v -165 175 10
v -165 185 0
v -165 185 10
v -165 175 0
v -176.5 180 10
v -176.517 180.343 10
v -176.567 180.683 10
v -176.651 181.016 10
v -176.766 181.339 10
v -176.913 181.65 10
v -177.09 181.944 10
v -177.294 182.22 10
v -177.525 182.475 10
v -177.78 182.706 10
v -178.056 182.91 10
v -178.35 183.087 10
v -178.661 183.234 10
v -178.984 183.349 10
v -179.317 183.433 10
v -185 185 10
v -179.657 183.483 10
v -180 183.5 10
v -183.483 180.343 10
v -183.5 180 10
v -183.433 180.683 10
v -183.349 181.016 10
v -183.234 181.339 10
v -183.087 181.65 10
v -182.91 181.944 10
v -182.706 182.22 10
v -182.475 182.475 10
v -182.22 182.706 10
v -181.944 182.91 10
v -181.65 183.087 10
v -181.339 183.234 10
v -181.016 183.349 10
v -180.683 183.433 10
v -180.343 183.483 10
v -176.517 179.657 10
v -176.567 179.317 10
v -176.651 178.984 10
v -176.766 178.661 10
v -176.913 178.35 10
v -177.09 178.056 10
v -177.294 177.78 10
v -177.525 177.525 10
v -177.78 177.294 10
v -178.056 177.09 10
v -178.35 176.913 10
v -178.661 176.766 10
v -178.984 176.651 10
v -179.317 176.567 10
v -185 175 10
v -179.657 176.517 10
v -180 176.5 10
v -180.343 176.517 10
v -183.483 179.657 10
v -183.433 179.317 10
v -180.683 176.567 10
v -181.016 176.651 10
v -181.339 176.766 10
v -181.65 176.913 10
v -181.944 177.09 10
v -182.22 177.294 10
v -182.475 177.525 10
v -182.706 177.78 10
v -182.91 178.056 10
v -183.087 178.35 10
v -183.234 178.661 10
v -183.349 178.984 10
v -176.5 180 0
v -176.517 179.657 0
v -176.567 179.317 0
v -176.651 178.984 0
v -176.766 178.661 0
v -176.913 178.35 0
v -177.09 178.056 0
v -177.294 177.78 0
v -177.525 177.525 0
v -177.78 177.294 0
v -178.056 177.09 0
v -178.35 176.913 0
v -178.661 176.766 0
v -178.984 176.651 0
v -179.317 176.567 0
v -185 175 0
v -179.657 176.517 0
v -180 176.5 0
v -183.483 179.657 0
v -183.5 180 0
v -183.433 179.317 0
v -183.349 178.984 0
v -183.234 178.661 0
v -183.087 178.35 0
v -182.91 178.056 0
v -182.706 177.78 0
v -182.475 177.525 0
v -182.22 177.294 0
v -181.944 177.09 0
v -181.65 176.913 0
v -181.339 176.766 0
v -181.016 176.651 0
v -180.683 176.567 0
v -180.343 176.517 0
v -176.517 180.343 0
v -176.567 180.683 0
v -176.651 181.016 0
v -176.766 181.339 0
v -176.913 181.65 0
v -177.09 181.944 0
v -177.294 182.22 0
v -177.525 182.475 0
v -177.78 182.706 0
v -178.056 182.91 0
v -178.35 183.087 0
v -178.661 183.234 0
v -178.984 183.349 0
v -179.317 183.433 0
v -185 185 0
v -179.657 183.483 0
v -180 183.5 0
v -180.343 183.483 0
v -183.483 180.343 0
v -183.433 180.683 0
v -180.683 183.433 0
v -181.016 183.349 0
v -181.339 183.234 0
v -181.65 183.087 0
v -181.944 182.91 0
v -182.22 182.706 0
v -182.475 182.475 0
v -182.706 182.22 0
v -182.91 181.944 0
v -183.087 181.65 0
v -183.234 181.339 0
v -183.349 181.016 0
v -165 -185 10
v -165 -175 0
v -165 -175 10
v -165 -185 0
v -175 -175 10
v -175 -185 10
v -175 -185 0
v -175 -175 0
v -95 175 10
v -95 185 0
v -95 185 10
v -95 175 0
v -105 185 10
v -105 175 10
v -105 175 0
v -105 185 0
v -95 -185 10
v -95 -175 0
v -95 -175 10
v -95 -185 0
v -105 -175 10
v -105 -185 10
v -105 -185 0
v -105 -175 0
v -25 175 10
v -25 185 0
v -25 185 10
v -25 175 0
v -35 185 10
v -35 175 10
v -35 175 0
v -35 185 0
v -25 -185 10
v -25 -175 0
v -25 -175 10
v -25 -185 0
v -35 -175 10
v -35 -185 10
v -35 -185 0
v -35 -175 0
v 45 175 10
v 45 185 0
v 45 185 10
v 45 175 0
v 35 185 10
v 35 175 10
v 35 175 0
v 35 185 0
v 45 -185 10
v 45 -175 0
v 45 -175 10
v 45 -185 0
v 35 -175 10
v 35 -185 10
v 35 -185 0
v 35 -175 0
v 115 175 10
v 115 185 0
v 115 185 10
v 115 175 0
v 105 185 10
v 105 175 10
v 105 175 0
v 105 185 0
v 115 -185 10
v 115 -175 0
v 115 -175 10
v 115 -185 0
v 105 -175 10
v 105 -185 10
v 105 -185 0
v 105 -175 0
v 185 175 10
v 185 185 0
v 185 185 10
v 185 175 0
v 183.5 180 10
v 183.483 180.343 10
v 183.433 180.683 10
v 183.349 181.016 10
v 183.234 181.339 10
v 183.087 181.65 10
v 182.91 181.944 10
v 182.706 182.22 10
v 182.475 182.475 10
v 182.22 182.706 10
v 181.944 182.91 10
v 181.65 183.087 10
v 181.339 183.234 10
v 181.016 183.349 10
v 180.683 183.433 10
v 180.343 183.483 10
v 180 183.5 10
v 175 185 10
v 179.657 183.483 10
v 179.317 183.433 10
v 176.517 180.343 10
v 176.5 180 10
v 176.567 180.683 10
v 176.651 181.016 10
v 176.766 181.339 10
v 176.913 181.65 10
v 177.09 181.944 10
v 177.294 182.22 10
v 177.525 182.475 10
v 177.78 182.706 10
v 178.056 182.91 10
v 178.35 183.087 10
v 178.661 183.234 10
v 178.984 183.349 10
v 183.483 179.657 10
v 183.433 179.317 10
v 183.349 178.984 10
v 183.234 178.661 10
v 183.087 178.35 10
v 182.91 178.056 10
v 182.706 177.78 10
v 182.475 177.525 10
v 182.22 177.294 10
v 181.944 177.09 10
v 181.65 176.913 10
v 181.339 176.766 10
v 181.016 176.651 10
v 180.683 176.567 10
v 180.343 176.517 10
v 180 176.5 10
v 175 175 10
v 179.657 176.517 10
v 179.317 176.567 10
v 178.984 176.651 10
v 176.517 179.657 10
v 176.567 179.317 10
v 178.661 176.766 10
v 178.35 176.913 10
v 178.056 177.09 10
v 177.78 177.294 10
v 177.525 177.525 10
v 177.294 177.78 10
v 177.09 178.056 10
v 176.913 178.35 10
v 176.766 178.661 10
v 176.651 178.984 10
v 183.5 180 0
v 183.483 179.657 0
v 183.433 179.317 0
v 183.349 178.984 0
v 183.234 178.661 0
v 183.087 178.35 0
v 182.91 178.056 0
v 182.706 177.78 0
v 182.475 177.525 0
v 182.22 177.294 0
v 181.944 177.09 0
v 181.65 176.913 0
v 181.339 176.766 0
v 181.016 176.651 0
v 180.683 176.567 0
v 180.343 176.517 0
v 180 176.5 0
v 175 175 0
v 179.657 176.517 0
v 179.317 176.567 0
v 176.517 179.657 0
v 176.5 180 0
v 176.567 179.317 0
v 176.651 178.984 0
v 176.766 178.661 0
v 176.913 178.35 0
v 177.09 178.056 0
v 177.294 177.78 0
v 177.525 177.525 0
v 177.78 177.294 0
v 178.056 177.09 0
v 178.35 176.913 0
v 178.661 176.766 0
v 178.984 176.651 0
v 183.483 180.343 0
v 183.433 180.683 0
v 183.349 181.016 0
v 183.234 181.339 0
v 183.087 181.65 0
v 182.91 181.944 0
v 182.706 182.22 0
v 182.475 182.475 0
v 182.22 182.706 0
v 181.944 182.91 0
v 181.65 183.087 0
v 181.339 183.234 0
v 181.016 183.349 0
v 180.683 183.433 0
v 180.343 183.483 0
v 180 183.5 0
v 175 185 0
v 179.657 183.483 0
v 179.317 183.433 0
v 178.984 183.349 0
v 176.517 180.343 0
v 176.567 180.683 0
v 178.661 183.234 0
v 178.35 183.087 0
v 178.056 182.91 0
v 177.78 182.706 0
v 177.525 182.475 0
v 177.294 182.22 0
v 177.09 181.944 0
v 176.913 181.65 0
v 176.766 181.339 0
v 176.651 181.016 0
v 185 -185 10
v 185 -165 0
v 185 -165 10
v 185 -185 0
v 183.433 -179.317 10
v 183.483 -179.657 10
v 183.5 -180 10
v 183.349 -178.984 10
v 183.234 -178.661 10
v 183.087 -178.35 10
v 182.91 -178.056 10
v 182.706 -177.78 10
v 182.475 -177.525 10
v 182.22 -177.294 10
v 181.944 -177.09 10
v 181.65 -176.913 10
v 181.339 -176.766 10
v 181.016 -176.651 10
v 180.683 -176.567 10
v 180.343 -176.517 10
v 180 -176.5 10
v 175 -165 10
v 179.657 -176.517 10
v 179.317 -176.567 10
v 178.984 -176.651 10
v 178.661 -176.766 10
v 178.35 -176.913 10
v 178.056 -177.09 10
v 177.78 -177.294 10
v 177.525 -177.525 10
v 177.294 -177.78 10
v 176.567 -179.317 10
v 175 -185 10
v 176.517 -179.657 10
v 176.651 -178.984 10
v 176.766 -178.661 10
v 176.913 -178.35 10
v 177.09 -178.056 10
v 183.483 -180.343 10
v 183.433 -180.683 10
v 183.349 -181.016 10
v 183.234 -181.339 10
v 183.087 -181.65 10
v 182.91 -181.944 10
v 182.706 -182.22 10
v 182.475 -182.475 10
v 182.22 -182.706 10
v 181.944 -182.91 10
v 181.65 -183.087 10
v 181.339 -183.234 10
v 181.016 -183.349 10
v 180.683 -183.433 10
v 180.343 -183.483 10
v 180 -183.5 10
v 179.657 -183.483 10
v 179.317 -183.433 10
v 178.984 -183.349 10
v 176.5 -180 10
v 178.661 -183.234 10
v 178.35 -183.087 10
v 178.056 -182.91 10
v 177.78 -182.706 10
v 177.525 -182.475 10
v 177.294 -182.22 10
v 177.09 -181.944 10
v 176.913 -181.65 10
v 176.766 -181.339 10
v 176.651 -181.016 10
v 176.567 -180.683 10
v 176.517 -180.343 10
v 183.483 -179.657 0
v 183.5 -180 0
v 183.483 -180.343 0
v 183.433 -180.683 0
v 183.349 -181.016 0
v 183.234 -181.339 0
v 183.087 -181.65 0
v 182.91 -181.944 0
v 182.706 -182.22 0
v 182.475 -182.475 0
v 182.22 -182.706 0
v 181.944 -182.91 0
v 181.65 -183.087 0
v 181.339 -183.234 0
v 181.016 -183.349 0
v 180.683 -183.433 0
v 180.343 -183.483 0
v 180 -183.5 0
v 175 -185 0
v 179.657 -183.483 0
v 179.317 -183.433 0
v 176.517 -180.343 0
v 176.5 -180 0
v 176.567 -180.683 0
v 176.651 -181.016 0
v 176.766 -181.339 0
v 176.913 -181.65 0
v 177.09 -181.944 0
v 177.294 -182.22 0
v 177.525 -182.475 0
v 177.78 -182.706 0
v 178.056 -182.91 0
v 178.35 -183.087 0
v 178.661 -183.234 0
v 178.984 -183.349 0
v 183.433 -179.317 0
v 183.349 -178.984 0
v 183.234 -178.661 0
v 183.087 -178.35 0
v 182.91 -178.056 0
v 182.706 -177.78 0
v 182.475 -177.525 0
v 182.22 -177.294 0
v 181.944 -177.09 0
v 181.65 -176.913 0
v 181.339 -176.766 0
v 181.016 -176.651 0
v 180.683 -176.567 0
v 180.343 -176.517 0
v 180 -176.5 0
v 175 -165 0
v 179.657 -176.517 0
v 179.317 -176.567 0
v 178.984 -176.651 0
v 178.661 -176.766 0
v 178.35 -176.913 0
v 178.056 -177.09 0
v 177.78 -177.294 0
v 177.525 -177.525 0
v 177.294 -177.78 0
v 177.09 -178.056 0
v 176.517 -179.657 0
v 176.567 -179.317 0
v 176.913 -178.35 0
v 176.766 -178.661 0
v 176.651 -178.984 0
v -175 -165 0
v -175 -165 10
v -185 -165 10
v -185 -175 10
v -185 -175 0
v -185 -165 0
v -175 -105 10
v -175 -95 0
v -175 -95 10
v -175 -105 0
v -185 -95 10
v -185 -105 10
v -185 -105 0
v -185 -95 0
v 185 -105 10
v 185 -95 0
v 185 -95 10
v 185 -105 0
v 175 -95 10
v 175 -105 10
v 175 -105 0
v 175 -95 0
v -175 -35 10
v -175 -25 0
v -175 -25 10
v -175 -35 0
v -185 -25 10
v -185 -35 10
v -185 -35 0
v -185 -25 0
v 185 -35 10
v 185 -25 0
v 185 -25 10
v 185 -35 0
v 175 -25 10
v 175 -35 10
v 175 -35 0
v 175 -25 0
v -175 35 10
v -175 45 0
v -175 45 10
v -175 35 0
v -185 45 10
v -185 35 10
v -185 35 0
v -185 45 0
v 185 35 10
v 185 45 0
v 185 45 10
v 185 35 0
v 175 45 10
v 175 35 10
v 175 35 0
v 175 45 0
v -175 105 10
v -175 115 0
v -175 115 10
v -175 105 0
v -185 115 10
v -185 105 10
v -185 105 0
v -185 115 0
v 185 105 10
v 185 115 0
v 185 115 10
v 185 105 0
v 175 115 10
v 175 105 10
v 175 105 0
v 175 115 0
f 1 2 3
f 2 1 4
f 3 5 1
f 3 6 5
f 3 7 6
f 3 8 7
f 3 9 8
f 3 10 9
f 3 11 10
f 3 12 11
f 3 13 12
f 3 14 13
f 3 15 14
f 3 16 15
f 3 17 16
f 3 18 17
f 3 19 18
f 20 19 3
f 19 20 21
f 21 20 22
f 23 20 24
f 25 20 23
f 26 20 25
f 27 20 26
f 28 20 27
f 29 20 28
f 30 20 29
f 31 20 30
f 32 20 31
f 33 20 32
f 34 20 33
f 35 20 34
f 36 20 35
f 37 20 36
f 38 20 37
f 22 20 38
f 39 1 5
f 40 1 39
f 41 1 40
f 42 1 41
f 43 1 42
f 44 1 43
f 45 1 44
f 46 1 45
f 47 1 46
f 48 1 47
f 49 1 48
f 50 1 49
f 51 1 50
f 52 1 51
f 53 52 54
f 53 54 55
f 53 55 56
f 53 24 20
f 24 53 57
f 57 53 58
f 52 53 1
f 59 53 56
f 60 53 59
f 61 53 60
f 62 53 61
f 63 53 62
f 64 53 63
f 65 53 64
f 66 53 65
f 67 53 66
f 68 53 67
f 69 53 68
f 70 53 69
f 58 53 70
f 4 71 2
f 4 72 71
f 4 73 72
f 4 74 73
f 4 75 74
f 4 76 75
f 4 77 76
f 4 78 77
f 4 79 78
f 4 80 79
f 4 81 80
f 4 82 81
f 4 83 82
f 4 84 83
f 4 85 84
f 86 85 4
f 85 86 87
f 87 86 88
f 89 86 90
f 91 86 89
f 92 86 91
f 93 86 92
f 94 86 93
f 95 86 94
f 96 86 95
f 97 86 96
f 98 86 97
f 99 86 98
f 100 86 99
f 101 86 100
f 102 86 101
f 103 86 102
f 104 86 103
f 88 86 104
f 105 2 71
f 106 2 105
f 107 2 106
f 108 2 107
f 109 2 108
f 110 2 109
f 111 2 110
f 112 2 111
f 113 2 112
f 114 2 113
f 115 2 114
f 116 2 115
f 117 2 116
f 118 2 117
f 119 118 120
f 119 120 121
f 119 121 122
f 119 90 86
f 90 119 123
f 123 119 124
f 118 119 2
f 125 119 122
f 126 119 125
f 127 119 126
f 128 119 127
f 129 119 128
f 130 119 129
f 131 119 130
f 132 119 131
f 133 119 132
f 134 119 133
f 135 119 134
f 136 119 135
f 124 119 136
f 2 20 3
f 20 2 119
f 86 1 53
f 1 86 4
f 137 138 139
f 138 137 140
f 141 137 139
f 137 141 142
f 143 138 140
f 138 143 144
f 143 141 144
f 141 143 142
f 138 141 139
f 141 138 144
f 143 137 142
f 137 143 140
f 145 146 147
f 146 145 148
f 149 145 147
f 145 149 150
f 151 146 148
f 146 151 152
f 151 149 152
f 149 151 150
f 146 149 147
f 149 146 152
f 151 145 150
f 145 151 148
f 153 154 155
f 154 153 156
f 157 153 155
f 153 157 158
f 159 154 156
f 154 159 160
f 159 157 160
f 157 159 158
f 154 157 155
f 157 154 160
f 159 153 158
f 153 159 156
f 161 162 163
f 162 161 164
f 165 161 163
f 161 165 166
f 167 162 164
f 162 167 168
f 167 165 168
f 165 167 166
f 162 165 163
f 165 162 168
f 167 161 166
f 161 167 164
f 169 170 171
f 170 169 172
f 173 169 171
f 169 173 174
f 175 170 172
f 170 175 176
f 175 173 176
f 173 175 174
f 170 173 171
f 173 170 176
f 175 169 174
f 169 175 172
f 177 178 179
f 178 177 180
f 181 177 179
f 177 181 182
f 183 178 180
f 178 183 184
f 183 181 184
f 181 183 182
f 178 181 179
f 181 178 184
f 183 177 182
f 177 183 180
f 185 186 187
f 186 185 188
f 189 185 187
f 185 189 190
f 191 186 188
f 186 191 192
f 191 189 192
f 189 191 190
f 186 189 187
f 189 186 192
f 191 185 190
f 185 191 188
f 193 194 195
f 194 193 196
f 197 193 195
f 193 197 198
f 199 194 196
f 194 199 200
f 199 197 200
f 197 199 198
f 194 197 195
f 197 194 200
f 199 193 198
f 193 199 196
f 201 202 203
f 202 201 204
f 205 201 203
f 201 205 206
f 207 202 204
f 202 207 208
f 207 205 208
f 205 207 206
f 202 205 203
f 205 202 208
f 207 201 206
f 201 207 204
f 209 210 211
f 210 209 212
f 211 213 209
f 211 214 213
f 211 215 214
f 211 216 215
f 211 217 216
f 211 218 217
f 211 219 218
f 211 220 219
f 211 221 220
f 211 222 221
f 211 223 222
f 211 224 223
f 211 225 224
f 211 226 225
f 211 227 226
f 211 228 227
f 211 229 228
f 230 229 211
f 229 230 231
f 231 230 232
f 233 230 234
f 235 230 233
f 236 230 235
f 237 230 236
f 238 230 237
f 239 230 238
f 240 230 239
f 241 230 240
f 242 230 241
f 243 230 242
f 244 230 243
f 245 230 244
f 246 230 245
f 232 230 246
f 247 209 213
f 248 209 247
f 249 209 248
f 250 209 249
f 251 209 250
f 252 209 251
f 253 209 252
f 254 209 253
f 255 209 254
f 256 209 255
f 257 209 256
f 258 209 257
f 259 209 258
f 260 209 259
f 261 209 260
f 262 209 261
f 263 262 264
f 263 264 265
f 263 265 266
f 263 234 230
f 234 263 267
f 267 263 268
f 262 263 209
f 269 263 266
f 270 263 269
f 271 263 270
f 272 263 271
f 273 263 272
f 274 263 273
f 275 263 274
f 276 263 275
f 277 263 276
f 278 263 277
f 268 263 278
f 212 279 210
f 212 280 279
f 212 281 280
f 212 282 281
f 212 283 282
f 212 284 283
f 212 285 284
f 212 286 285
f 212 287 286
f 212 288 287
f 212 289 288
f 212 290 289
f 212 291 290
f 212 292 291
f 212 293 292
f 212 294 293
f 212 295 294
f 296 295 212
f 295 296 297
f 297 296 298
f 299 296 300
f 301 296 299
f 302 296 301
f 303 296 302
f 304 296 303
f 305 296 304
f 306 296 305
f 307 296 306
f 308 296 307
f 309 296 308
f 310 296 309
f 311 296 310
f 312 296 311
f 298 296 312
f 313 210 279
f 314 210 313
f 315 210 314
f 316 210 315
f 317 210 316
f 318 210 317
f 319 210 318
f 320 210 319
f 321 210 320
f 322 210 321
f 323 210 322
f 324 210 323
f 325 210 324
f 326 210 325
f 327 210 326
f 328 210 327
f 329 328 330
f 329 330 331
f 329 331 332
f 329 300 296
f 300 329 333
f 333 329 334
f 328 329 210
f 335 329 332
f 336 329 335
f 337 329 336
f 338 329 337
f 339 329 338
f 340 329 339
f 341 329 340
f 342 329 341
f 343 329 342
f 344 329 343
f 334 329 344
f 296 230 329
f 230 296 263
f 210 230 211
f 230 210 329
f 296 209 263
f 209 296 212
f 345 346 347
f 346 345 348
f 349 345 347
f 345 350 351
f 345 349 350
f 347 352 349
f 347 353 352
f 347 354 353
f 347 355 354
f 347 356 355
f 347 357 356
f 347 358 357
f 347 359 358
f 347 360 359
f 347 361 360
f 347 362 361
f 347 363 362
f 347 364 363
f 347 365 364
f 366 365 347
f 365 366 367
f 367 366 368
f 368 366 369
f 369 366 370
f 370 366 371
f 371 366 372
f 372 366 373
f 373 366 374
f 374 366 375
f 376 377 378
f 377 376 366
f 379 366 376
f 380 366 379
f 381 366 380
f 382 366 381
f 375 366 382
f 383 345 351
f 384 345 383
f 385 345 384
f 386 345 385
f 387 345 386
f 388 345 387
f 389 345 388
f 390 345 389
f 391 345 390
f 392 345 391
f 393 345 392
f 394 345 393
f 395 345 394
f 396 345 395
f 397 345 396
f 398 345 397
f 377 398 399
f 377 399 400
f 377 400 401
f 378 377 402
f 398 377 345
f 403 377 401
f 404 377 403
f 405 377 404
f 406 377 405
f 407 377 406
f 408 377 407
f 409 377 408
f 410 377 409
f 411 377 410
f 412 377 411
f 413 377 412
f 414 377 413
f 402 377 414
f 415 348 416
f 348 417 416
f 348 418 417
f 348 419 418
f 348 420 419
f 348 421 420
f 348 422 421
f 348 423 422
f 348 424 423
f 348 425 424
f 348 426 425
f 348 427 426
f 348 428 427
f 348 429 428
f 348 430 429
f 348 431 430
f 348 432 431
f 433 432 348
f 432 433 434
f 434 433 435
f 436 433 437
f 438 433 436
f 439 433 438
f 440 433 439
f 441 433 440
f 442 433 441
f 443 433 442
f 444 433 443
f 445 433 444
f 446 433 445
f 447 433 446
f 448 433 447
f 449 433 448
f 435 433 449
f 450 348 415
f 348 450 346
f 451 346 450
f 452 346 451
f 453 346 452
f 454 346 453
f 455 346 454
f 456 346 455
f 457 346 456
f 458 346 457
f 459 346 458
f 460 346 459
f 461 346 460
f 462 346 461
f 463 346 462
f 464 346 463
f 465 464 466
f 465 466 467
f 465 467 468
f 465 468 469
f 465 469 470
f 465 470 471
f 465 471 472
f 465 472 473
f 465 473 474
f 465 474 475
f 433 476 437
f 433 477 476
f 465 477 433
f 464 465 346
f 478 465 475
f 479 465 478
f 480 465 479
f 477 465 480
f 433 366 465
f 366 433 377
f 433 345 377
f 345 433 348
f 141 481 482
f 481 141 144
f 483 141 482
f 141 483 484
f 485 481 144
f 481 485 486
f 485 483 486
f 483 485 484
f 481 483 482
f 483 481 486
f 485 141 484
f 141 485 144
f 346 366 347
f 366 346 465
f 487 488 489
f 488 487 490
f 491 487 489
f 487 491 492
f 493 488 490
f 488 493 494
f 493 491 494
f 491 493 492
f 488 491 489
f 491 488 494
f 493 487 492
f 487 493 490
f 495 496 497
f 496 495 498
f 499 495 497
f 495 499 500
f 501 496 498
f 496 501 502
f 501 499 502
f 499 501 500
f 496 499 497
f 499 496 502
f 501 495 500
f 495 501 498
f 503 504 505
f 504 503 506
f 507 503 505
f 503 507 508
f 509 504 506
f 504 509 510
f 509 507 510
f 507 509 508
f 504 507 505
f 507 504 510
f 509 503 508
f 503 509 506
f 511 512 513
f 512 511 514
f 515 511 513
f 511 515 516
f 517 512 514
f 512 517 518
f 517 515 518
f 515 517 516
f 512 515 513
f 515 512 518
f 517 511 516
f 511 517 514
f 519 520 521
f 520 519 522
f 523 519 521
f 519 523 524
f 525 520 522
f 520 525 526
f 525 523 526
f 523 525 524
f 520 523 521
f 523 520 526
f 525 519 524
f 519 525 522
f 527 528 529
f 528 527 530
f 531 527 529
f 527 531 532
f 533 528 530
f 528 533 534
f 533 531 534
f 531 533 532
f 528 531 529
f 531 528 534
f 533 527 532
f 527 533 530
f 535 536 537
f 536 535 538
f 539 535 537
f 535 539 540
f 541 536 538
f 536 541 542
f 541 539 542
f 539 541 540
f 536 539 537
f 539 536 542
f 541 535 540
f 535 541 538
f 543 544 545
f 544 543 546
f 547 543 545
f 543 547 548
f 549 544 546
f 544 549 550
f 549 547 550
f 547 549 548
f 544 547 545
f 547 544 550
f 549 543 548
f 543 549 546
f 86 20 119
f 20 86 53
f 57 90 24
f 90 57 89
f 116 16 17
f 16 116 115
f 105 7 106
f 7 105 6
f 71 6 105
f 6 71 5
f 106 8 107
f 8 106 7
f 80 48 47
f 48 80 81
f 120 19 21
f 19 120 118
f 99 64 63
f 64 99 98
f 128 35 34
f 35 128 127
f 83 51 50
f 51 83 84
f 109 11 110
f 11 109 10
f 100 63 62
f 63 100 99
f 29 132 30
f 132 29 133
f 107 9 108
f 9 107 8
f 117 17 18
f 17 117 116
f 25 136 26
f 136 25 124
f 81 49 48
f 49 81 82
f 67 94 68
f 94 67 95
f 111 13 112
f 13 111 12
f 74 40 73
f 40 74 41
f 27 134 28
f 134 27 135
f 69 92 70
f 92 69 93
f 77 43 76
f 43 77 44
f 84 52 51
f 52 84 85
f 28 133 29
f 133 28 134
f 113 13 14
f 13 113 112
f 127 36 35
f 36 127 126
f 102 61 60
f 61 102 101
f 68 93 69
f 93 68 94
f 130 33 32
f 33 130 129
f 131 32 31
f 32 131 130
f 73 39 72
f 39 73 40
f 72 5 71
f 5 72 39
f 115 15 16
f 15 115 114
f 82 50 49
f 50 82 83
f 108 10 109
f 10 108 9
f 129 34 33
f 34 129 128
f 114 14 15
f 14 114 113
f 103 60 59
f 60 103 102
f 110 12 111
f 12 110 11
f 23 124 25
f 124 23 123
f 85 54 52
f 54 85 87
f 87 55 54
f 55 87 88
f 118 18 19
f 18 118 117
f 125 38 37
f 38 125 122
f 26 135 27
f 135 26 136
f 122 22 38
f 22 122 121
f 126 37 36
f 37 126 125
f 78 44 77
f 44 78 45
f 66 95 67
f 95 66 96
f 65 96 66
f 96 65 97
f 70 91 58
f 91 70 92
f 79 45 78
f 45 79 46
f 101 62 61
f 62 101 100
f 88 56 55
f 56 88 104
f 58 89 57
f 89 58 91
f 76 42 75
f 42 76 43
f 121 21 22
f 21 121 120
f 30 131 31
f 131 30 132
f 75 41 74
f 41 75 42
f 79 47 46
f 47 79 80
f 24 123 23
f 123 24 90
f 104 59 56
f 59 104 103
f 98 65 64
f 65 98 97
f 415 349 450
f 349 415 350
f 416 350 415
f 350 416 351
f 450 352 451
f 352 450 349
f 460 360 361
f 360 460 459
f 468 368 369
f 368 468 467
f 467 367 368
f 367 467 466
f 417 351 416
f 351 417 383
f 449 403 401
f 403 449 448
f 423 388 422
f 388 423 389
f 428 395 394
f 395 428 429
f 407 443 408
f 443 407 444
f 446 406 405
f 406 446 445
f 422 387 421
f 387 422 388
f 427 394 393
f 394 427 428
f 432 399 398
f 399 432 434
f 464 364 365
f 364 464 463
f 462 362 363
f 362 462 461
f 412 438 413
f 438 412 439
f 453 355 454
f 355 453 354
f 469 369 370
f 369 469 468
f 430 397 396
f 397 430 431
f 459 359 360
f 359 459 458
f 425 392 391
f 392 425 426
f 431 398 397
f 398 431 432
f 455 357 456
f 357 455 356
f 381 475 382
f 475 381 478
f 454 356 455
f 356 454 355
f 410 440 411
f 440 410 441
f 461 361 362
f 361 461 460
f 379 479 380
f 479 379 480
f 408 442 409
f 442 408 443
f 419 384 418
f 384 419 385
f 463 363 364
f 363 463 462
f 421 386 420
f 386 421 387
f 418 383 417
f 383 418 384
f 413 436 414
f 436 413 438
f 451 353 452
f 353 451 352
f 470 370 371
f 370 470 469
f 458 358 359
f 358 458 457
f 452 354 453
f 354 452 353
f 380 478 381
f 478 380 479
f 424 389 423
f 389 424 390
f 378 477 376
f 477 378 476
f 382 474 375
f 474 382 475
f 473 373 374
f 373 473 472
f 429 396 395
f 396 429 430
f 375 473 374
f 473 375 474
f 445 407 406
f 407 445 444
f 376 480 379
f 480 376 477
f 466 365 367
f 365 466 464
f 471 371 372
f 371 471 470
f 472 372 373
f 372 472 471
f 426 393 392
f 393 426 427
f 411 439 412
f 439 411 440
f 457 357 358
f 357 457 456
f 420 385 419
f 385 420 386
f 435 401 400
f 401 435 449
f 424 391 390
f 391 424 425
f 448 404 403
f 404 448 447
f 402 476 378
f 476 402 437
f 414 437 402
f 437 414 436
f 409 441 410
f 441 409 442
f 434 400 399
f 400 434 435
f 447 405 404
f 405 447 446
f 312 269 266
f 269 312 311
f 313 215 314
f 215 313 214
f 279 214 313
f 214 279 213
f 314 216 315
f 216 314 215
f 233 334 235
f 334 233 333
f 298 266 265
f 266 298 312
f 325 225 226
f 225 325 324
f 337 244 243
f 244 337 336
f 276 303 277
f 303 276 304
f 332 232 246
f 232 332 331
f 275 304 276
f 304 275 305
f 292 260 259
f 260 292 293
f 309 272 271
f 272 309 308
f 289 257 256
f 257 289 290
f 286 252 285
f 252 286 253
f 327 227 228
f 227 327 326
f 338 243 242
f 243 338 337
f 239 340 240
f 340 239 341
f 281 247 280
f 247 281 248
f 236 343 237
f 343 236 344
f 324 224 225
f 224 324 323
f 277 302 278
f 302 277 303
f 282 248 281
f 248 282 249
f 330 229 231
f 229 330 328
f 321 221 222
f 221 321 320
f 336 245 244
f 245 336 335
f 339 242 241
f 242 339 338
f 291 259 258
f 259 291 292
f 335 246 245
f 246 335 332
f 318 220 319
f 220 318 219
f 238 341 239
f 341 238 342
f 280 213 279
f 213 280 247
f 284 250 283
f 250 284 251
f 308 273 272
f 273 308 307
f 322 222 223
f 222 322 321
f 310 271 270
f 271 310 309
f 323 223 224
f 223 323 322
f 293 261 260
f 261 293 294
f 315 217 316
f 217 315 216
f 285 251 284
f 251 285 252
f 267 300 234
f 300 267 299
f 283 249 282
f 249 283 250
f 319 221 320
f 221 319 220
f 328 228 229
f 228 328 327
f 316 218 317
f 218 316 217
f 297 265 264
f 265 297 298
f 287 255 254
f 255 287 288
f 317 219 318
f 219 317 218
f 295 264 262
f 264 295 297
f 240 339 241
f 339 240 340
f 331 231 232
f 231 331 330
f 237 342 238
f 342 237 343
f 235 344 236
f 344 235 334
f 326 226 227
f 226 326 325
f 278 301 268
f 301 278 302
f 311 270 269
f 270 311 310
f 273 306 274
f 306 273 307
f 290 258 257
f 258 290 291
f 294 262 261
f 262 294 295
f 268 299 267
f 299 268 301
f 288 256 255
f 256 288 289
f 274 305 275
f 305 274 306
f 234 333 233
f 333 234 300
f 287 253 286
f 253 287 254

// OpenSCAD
// ring_68.scad - ring index 68 (z bottom = 680 mm)
$fn = 64; bar = 10; half_b = bar/2; outer = 370; half_outer = outer/2;
front_y = 180; back_y = -180; left_x = -180; right_x = 180;
x_centers = [-170, -100, -30, 40, 110, 180];
z_centers = [5, 85, 155, 225, 295, 365, 435, 505, 575, 645, 715]; ring_z = 680;
module place_box(cx, cy, sx, sy) { translate([cx - sx/2, cy - sy/2, 0]) cube([sx, sy, bar]); }

difference() { union() {
    for (x = x_centers) { place_box(x, front_y, bar, bar); place_box(x, back_y, bar, bar); }
    for (y = x_centers) { place_box(left_x, y, bar, bar); place_box(right_x, y, bar, bar); }
    for (zc = z_centers) if ((zc - half_b < ring_z + bar) && (zc + half_b > ring_z)) {
        translate([-half_outer, front_y - half_b, 0]) cube([outer, bar, bar]);
        translate([-half_outer, back_y - half_b, 0])  cube([outer, bar, bar]);
        translate([left_x - half_b, -half_outer, 0])  cube([bar, outer, bar]);
        translate([right_x - half_b, -half_outer, 0]) cube([bar, outer, bar]);
    }
  }
  for (cx = [-180, 180]) for (cy = [-180, 180]) translate([cx, cy, 0]) cylinder(h = bar, r = 3.5, $fn = 64);
}
